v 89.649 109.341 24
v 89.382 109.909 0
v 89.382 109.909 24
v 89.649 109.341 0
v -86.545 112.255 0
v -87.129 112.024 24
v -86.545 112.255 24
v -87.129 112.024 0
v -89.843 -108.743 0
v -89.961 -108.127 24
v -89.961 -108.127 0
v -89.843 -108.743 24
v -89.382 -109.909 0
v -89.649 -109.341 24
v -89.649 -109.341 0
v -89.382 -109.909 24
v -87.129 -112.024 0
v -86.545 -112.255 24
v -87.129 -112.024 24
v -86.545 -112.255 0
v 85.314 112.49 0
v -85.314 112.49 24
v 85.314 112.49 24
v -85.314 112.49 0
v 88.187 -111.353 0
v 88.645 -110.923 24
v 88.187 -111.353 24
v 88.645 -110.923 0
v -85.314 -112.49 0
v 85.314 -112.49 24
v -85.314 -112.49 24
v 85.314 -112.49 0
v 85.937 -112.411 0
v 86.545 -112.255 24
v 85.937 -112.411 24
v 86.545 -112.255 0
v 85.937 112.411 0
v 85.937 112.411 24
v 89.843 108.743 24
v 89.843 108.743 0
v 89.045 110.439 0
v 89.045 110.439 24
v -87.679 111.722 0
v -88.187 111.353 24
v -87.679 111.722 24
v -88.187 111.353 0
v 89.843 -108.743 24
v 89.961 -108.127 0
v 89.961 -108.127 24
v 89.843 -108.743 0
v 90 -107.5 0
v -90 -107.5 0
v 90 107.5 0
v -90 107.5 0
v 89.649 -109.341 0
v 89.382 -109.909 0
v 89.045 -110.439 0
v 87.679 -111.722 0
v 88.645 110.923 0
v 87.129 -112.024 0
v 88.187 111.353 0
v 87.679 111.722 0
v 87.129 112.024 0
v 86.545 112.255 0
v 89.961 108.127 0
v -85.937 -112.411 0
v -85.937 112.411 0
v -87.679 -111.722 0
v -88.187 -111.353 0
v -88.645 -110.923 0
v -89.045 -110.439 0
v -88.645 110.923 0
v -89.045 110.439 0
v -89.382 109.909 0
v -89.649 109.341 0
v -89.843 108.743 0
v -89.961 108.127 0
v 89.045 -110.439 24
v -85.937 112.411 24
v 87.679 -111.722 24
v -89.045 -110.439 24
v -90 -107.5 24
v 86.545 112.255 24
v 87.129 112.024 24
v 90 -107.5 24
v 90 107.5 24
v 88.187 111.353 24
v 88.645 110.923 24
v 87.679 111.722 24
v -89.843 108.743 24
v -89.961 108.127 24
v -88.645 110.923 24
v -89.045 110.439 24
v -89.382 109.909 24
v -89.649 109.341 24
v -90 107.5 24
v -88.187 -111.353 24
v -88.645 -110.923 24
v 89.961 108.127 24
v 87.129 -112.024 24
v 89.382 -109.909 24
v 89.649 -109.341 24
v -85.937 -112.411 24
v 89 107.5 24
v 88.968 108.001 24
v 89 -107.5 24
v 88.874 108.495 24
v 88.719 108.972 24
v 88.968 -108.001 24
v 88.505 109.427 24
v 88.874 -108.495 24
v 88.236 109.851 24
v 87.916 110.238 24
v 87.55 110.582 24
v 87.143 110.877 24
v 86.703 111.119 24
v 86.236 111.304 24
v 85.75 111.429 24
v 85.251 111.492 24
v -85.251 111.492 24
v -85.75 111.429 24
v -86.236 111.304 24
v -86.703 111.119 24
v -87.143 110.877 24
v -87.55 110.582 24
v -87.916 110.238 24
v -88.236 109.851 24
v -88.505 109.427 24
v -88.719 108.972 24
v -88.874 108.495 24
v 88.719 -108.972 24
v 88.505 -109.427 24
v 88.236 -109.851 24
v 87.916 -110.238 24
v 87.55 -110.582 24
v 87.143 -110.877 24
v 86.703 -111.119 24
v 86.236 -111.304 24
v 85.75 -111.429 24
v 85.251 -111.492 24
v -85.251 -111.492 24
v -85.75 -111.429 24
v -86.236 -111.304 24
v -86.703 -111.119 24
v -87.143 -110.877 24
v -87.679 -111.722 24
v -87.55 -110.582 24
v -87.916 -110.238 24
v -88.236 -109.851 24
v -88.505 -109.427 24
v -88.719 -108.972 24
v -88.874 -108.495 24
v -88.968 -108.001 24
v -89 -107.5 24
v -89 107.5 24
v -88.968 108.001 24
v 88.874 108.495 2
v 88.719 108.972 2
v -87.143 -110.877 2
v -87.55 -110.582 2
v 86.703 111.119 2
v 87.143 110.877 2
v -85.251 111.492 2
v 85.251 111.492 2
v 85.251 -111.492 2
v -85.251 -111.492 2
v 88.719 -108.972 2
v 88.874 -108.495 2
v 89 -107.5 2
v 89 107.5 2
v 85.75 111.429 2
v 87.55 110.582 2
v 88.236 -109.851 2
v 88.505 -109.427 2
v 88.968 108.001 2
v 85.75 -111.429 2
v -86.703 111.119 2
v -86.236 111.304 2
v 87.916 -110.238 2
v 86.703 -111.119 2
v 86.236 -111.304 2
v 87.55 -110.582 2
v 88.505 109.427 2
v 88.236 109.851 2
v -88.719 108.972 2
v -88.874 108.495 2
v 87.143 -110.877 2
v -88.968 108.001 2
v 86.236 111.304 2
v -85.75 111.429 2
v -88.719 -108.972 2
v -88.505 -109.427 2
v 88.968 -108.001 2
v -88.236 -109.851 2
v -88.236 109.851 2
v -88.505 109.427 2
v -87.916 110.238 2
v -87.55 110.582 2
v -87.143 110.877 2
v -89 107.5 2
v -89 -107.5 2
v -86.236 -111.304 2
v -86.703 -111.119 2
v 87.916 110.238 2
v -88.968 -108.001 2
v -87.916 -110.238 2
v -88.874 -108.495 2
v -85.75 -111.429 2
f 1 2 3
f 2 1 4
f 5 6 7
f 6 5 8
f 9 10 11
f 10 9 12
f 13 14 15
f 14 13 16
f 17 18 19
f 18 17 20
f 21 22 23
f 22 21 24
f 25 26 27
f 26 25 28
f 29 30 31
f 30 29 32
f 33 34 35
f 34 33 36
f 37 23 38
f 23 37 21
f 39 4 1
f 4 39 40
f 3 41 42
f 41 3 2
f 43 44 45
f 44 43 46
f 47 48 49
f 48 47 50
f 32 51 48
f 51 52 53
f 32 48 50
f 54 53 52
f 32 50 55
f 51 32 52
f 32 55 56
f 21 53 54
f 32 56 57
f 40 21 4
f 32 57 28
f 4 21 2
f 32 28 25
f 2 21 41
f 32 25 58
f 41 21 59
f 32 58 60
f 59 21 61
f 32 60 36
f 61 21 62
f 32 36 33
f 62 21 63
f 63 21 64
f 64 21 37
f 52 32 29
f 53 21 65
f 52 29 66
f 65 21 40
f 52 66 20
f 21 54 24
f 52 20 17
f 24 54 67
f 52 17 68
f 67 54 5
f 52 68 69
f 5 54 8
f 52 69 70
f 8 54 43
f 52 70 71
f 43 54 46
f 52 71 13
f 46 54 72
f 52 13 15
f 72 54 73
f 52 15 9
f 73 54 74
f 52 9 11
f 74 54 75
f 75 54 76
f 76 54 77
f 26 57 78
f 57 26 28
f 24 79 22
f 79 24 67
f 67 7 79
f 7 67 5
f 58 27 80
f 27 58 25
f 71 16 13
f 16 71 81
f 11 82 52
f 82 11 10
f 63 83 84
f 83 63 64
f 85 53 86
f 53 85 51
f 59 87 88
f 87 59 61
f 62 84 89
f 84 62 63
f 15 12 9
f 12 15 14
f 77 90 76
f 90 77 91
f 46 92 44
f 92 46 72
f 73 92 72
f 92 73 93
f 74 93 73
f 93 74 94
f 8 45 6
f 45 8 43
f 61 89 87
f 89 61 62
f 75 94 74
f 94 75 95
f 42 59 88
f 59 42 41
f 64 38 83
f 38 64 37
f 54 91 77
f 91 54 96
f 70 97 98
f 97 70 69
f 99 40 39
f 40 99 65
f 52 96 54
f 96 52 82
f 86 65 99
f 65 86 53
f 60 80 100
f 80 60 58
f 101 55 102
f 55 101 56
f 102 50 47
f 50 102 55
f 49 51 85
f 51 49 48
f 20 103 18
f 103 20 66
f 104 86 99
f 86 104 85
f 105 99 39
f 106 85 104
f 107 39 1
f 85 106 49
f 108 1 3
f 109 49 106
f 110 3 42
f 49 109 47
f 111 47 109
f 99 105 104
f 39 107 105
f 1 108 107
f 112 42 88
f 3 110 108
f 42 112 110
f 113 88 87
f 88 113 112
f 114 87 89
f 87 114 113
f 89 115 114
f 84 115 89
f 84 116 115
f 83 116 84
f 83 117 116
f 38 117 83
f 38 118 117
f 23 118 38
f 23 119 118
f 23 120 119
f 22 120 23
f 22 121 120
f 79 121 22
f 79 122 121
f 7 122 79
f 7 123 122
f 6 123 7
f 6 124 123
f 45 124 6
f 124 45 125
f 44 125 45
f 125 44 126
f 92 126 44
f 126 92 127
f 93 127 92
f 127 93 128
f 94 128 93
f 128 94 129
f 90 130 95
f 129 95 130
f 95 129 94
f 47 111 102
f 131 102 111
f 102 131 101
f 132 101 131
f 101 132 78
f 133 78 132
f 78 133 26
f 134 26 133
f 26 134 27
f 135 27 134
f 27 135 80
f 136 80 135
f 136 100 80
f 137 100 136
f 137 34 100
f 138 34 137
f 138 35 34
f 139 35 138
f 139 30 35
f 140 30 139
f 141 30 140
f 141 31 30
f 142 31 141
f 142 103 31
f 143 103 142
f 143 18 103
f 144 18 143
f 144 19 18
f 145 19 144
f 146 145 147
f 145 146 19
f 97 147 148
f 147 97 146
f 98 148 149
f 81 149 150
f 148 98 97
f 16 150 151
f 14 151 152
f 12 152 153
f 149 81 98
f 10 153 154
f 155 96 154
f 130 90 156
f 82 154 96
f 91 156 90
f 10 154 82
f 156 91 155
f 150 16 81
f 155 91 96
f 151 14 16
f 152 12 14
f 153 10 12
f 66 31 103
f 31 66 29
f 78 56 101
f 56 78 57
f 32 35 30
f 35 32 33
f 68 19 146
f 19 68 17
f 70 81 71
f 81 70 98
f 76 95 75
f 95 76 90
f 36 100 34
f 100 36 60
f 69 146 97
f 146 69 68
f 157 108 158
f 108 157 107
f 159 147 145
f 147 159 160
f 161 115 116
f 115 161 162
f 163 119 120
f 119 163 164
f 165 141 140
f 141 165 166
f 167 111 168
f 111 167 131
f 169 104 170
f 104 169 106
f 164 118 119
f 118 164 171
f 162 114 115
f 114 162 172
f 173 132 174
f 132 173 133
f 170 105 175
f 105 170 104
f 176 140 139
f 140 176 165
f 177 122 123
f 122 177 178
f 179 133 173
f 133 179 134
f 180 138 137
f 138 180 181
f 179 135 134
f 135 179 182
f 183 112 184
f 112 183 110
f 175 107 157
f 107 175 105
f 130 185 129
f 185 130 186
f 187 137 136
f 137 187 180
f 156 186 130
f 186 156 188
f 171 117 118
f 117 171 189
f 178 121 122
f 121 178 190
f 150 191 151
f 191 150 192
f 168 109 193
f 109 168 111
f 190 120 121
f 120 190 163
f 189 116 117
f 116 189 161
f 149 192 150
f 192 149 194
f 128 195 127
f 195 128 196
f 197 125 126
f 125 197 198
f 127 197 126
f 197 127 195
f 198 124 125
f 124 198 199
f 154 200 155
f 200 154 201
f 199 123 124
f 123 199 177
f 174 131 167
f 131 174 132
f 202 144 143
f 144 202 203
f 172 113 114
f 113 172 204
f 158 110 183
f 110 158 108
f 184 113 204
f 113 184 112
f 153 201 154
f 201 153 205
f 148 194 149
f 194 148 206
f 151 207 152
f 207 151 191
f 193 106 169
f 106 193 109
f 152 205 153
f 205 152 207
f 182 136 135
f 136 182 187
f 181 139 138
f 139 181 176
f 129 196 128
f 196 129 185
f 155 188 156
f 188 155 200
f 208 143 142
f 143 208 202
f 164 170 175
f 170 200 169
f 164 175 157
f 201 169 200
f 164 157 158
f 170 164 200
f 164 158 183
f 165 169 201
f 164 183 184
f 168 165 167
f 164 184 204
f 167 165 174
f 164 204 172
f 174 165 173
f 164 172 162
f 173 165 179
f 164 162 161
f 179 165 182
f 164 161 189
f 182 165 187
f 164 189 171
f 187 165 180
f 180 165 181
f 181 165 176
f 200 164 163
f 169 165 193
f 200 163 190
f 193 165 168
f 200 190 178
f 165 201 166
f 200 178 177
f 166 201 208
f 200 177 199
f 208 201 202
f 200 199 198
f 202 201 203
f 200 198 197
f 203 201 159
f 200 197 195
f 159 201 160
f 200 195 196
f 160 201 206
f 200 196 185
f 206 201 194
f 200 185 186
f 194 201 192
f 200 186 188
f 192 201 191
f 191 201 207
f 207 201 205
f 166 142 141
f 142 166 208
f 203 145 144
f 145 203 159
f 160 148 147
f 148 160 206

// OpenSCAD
$fn = 50;


difference() {
	union() {
		hull() {
			translate(v = [-85.0000000000, 107.5000000000, 0]) {
				cylinder(h = 24, r = 5);
			}
			translate(v = [85.0000000000, 107.5000000000, 0]) {
				cylinder(h = 24, r = 5);
			}
			translate(v = [-85.0000000000, -107.5000000000, 0]) {
				cylinder(h = 24, r = 5);
			}
			translate(v = [85.0000000000, -107.5000000000, 0]) {
				cylinder(h = 24, r = 5);
			}
		}
	}
	union() {
		translate(v = [0, 0, 2]) {
			hull() {
				translate(v = [-85.0000000000, 107.5000000000, 0]) {
					cylinder(h = 22, r = 4);
				}
				translate(v = [85.0000000000, 107.5000000000, 0]) {
					cylinder(h = 22, r = 4);
				}
				translate(v = [-85.0000000000, -107.5000000000, 0]) {
					cylinder(h = 22, r = 4);
				}
				translate(v = [85.0000000000, -107.5000000000, 0]) {
					cylinder(h = 22, r = 4);
				}
			}
		}
	}
}
